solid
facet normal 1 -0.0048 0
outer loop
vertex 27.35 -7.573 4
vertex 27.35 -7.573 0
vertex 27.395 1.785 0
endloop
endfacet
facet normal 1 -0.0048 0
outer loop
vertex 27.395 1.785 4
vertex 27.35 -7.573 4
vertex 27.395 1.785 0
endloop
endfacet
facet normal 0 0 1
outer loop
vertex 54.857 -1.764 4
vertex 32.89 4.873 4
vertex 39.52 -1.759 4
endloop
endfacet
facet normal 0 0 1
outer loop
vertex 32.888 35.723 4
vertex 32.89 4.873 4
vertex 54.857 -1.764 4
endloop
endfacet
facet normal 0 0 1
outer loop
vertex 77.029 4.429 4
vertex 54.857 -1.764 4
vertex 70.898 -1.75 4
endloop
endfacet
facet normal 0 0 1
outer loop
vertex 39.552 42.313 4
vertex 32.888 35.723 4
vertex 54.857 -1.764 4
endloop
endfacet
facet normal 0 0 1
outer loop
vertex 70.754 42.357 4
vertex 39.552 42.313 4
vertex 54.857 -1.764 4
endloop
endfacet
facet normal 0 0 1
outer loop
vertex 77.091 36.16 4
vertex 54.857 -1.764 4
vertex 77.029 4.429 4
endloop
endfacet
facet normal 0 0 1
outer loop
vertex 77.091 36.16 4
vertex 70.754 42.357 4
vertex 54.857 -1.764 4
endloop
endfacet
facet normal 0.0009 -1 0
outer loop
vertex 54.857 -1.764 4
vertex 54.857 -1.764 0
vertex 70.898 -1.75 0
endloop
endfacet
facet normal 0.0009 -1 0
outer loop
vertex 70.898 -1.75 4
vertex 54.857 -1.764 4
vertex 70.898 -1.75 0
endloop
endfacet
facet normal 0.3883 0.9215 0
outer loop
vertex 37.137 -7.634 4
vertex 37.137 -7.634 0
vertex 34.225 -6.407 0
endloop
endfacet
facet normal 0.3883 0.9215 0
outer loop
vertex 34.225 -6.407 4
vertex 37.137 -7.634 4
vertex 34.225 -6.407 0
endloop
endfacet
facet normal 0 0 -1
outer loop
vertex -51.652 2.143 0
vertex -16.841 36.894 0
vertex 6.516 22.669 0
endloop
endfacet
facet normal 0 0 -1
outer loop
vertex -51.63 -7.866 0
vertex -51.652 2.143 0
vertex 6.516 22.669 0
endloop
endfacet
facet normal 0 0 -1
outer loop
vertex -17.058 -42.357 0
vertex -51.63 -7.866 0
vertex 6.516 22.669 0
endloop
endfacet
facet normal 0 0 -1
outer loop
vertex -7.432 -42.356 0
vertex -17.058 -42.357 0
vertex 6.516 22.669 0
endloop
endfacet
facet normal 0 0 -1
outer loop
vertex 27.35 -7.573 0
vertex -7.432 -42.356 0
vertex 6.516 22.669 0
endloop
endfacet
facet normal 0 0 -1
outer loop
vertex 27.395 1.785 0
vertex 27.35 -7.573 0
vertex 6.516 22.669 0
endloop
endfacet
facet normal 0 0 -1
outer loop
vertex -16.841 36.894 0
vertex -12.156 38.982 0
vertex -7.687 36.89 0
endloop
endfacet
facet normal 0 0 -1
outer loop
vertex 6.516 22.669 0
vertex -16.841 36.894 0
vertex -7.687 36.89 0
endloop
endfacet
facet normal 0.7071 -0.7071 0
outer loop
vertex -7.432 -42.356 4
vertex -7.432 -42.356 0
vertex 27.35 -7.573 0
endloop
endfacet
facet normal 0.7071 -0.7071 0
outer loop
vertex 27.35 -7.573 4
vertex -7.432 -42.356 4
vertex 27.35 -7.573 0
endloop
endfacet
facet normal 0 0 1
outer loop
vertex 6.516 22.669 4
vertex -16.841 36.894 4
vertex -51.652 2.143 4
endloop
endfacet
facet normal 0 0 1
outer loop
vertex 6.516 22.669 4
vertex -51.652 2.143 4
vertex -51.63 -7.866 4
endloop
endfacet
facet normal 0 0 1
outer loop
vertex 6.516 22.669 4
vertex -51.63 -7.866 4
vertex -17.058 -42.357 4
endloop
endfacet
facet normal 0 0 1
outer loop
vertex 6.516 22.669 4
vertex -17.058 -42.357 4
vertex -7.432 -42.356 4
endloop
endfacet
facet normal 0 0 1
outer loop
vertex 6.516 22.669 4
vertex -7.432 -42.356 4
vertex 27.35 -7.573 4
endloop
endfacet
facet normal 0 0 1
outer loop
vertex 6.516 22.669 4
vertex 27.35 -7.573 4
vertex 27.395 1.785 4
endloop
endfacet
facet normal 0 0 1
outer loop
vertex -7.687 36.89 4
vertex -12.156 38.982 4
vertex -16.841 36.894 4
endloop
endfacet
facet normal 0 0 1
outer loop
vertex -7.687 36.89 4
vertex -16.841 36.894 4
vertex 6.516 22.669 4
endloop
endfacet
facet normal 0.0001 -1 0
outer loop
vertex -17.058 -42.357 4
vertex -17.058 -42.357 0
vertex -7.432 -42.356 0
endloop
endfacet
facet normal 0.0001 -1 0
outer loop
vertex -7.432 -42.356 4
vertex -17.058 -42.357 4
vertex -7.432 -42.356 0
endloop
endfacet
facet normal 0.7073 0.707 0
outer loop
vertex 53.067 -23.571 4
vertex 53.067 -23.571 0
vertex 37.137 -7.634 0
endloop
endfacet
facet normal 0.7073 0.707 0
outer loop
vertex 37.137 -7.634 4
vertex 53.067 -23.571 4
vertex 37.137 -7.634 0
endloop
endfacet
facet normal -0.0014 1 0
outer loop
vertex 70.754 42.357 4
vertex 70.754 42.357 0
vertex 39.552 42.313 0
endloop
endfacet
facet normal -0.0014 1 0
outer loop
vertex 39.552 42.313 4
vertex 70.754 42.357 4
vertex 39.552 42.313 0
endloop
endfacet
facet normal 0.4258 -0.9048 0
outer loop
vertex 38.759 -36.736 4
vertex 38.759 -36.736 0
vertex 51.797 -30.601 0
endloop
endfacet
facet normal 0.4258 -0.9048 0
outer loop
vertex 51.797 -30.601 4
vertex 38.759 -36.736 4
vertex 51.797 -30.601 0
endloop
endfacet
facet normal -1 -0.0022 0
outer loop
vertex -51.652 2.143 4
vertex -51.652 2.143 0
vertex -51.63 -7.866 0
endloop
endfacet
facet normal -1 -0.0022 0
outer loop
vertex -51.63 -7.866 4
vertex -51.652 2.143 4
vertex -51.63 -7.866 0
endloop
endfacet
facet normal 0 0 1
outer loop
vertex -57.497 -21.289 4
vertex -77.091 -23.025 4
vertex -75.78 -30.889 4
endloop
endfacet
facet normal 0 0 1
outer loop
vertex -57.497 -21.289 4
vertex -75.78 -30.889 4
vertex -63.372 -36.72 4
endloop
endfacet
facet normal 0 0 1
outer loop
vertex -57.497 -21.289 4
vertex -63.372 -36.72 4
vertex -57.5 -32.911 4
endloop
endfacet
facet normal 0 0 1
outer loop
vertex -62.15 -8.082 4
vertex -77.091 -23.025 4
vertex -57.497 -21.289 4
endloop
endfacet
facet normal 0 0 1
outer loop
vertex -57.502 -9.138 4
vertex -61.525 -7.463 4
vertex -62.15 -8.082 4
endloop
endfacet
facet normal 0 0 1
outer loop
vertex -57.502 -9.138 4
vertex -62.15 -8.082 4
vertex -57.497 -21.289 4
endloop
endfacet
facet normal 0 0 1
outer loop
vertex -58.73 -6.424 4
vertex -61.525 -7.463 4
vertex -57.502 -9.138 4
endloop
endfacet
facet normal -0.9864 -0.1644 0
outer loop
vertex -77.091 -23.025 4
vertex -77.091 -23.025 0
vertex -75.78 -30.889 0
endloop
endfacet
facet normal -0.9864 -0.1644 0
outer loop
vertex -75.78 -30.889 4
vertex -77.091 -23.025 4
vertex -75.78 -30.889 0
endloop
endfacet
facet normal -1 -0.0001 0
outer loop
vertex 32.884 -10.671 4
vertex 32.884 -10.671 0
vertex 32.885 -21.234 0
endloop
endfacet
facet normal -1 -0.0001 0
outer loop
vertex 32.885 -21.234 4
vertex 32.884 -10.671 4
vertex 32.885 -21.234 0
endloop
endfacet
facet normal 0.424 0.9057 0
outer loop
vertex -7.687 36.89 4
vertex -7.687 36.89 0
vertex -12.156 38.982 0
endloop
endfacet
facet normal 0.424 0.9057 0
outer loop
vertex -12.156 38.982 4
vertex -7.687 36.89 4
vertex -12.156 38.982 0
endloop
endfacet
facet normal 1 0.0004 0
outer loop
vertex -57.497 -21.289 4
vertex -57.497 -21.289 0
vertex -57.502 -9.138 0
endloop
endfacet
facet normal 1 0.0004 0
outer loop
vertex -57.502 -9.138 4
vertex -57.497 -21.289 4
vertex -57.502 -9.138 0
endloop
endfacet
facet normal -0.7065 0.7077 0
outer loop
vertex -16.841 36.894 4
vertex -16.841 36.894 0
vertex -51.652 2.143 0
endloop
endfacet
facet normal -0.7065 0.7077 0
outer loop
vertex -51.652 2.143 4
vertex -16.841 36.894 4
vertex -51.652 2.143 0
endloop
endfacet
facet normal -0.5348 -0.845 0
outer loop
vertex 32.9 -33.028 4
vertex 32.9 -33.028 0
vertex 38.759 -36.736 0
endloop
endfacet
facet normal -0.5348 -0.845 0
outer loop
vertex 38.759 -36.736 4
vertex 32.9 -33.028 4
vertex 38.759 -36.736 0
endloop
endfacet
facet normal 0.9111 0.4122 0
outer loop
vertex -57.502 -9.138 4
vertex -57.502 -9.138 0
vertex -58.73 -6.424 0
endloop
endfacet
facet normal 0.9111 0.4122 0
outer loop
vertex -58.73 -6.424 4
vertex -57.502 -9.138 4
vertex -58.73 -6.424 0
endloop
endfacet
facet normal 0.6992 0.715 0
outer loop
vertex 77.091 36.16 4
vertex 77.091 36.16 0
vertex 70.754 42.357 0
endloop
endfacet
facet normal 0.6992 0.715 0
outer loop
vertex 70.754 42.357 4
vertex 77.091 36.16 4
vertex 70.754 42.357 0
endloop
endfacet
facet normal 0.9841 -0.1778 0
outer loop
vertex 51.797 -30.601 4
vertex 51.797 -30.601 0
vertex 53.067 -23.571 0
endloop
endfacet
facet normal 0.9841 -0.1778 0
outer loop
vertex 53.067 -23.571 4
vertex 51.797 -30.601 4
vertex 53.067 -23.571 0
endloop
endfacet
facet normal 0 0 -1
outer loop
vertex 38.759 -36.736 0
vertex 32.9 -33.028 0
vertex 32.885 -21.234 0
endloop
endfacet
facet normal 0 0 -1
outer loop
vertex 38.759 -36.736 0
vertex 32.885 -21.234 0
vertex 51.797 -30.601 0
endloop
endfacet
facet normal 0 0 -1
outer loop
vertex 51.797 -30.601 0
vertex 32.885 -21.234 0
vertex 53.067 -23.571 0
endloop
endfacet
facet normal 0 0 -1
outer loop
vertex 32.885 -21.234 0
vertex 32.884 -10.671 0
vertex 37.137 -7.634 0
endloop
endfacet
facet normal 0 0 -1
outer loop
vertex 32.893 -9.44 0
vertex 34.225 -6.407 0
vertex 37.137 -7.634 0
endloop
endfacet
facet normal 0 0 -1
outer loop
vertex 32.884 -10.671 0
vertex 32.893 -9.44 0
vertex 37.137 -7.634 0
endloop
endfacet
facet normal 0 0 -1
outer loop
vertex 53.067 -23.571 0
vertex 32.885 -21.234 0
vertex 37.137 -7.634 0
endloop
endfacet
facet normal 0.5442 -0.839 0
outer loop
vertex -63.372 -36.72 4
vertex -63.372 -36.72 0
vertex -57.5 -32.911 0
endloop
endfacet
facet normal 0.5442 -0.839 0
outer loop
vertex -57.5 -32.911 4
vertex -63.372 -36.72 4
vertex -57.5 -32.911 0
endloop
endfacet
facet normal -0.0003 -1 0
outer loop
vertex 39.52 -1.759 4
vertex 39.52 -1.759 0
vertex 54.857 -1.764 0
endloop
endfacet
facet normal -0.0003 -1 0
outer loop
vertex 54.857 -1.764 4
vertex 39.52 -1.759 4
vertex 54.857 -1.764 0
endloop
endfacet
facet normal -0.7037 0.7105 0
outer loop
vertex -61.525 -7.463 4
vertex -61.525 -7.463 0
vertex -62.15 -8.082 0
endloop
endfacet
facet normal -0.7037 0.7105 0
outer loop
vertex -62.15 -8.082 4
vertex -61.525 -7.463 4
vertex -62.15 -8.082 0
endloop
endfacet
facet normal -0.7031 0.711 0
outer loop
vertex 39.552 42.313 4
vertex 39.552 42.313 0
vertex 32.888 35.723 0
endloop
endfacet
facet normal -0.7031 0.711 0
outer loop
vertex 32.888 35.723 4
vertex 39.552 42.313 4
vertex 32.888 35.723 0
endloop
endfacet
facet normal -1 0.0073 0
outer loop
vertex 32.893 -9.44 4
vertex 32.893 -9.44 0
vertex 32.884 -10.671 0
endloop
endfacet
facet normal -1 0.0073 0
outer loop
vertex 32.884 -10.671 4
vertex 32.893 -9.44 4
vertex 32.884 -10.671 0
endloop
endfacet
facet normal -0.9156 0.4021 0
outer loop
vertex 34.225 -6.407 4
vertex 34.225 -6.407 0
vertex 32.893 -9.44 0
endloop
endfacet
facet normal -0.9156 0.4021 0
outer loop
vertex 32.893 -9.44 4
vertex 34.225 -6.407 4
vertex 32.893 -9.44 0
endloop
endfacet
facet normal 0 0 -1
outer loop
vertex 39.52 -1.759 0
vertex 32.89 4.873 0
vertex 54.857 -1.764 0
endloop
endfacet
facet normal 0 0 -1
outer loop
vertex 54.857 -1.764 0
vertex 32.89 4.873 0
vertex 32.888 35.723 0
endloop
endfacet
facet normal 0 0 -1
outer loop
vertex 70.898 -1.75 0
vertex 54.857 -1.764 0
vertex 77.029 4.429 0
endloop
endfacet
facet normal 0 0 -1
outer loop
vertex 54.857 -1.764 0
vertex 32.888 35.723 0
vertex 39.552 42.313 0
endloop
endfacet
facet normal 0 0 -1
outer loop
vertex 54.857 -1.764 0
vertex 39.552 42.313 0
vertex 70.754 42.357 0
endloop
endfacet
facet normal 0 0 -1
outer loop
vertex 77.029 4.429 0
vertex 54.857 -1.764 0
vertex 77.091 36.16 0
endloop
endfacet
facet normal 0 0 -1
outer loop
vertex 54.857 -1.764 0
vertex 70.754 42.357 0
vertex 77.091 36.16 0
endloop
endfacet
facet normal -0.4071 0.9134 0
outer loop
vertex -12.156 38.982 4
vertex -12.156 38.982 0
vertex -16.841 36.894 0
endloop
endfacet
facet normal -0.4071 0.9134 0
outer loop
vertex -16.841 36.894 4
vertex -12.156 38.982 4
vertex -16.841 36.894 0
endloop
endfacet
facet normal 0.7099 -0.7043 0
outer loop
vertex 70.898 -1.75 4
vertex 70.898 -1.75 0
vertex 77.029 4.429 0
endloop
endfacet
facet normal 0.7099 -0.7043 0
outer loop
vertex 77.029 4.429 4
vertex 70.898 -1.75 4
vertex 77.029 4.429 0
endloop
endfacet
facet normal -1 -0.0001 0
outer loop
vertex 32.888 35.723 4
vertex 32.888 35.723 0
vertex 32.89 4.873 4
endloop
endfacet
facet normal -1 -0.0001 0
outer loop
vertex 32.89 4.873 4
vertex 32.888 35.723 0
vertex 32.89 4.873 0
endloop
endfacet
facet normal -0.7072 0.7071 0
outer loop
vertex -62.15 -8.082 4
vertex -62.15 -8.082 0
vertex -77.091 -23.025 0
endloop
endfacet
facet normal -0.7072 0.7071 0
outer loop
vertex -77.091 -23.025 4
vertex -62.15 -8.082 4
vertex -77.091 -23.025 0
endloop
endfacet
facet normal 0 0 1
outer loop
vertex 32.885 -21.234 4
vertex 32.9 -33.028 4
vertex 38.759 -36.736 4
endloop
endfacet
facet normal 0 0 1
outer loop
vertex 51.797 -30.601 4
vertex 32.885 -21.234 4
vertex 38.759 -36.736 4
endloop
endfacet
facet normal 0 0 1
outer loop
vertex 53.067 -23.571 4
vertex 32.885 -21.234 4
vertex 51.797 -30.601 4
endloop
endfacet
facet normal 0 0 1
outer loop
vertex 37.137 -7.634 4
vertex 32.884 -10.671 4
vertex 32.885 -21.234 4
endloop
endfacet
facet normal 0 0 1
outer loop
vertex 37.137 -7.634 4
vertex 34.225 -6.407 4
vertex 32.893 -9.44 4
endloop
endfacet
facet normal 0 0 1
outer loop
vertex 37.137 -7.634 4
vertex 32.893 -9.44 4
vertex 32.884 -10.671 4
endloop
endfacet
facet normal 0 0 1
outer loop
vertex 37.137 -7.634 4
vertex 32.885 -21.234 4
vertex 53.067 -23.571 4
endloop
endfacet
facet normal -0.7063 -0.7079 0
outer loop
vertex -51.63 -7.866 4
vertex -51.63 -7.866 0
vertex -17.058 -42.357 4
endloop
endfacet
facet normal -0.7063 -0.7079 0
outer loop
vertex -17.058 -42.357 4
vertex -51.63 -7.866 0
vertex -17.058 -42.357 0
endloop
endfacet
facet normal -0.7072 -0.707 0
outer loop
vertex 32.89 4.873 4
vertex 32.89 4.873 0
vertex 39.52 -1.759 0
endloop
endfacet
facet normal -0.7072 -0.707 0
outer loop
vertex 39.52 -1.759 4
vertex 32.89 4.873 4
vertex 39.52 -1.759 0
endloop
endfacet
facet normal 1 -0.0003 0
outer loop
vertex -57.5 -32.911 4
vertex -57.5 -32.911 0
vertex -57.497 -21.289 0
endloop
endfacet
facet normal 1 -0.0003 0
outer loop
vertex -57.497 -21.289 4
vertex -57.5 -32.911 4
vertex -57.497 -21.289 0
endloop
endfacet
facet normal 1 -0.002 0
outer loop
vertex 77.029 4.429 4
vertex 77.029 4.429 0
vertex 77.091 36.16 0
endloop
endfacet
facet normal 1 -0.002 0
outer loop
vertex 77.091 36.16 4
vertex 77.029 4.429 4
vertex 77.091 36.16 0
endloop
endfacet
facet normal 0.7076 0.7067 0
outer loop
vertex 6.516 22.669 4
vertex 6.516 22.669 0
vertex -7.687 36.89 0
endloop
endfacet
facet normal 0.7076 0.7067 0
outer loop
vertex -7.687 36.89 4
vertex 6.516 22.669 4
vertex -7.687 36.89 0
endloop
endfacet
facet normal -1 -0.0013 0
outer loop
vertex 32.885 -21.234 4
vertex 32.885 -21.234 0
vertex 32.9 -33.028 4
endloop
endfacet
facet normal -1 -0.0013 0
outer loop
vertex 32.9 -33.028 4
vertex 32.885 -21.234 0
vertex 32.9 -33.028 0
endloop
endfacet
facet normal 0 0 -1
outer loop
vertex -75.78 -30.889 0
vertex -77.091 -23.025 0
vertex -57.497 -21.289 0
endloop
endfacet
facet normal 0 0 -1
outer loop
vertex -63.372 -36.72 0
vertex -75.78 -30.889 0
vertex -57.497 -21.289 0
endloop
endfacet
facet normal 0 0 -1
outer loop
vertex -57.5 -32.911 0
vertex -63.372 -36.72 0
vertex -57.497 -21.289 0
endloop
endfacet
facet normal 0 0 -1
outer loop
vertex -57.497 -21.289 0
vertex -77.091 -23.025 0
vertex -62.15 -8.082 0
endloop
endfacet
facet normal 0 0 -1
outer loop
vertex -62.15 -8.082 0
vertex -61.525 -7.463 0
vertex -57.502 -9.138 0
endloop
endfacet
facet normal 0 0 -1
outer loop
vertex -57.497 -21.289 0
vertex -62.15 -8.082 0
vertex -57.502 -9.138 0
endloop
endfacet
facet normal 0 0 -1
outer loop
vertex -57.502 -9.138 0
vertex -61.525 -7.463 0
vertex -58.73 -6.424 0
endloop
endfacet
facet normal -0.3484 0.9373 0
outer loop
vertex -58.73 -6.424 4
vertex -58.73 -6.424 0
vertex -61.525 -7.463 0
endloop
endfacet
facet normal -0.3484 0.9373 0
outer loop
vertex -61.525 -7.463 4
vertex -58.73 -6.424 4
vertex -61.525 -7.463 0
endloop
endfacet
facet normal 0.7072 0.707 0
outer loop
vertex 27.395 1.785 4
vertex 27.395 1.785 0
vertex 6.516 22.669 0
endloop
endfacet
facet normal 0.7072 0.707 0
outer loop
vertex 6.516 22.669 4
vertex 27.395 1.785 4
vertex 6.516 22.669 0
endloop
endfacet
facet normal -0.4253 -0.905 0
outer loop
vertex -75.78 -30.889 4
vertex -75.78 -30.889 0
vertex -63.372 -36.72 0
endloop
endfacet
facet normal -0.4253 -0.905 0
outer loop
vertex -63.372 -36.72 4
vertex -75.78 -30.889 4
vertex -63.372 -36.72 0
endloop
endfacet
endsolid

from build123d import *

# Parameters (mm, degrees)
F1_DEPTH = 4


with BuildPart() as f1:
    # F0 (on Top) → F1 (new body)
    with BuildSketch(Plane.XY):
        Polygon((-7.687041, 36.889738), (-12.156364, 38.982289), (-16.841349, 36.893872), (-51.651627, 2.143194), (-51.630268, -7.866186), (-17.057701, -42.35676), (-7.432104, -42.355726), (27.350269, -7.573353), (27.395055, 1.784904), (6.516398, 22.669073), align=None)
        Polygon((39.519724, -1.75941), (54.8566, -1.763544), (70.898343, -1.749764), (77.029235, 4.42936), (77.091246, 36.159723), (70.753649, 42.35676), (39.552108, 42.313008), (32.887915, 35.72254), (32.889982, 4.872743), align=None)
        Polygon((32.88447, -10.671183), (32.885159, -21.233846), (32.900318, -33.028475), (38.759047, -36.736431), (51.796666, -30.60106), (53.066529, -23.570654), (37.137096, -7.633987), (34.225301, -6.406844), (32.893427, -9.439561), align=None)
        Polygon((-57.499677, -32.910652), (-57.497265, -21.288623), (-57.502433, -9.13846), (-58.730265, -6.424069), (-61.524926, -7.462766), (-62.149867, -8.082194), (-77.091246, -23.024606), (-75.780387, -30.889415), (-63.372187, -36.720239), align=None)
    extrude(amount=F1_DEPTH)


solid = f1.part
